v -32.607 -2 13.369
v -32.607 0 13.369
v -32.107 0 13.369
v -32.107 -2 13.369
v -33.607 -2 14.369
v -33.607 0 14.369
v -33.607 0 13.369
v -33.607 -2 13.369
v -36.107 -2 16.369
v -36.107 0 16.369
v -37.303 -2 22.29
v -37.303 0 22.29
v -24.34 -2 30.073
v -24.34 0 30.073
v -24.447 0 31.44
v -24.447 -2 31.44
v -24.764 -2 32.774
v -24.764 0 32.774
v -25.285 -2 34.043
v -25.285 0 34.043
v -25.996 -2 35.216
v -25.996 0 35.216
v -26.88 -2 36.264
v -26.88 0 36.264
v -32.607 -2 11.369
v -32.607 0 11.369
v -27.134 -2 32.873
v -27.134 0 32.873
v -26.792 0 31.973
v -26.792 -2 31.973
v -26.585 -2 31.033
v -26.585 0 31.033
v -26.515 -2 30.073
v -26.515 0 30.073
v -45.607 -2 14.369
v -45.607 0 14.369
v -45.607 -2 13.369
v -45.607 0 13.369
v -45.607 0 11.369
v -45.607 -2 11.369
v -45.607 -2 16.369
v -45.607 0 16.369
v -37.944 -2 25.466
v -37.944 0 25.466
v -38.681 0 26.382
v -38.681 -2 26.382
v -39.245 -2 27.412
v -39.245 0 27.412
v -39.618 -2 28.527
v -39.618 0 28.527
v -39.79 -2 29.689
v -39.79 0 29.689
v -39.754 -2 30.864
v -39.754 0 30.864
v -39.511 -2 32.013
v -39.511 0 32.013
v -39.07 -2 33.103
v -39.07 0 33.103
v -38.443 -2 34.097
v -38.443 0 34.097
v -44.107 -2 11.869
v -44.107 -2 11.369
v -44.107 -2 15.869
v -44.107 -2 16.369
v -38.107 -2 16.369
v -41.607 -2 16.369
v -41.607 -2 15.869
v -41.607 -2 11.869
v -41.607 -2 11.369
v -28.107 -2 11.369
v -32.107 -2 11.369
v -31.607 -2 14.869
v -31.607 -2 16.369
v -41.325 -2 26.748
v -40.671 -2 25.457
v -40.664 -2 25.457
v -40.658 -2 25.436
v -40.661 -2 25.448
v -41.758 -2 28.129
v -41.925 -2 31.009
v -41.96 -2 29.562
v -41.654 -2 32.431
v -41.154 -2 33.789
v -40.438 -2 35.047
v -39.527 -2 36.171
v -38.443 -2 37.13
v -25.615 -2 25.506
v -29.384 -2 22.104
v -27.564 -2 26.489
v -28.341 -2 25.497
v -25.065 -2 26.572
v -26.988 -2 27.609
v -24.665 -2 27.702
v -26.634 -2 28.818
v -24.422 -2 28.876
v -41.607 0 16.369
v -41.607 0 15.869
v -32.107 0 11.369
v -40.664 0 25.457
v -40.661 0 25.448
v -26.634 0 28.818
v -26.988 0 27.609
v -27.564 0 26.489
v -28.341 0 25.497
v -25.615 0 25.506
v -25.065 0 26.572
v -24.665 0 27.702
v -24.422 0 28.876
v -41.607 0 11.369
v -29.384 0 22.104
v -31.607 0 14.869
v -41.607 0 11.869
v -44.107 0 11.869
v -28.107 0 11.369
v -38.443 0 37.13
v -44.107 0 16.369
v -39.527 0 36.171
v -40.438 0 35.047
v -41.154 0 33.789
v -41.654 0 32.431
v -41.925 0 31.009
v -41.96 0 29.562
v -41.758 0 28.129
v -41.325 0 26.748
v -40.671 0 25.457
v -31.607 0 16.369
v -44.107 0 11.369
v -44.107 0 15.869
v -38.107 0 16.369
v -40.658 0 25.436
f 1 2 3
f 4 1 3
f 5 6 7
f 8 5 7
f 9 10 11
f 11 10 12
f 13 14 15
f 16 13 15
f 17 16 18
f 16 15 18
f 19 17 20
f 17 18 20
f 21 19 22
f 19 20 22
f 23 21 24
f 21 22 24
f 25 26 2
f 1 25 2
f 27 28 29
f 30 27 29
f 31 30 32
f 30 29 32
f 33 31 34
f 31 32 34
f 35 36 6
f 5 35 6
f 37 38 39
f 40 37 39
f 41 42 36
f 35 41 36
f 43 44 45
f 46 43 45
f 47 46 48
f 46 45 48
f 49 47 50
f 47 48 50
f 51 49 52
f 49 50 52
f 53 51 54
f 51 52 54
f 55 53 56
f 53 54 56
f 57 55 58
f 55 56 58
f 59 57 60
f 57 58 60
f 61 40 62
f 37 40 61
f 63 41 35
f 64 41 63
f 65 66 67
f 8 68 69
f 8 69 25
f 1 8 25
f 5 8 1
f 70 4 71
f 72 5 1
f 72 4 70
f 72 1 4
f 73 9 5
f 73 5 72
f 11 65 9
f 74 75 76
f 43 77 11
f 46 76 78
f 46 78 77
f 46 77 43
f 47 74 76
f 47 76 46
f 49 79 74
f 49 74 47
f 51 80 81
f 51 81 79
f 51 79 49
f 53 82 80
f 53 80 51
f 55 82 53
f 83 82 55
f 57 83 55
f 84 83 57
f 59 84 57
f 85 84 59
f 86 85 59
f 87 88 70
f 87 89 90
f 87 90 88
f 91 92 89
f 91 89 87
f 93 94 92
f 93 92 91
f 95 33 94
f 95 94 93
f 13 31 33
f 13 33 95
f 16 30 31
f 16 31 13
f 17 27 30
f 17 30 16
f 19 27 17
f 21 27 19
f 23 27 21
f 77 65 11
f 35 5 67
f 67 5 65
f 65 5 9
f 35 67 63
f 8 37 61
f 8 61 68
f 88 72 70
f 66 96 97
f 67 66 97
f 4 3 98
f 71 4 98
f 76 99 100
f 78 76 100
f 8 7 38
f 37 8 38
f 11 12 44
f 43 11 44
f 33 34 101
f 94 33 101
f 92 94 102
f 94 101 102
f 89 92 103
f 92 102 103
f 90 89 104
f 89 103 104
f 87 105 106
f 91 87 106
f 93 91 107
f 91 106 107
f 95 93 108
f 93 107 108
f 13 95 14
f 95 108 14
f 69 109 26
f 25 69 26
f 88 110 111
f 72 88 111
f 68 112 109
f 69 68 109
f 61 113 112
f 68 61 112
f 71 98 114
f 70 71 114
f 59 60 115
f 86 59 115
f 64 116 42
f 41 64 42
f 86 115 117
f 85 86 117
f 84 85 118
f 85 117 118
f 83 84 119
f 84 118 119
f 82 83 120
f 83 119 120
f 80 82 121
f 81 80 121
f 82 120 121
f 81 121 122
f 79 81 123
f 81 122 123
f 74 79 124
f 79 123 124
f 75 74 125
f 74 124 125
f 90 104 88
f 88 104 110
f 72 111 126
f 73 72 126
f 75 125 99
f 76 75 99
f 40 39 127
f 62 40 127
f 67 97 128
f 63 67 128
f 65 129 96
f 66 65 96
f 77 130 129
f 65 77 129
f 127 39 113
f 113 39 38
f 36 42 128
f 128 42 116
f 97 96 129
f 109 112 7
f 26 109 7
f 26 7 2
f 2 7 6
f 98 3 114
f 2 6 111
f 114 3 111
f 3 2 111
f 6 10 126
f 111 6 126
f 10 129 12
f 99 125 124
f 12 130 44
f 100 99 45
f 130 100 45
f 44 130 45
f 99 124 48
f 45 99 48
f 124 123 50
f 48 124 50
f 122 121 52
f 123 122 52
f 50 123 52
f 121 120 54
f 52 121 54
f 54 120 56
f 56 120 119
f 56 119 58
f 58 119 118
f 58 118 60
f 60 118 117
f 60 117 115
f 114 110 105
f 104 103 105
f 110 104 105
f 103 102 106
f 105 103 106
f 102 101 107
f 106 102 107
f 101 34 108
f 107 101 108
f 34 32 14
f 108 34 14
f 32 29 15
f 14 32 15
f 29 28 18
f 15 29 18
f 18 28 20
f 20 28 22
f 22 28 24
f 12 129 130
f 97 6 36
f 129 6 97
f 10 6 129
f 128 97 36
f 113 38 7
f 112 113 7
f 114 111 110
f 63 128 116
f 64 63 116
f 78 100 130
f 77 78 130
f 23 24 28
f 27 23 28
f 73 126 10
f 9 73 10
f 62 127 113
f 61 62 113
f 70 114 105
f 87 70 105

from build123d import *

# Parameters (mm, degrees)
F1_DEPTH = 2


with BuildPart() as f1:
    # F0 (on Front) → F1 (new body)
    with BuildSketch(Plane.XZ):
        with BuildLine():
            ThreePointArc((-38.4432851938, 37.1302077967), (-41.8189272985, 31.7253624753), (-40.6708321656, 25.4572534994))
            Line((-40.6708321656, 25.4572534994), (-40.6635933433, 25.4572770938))
            Line((-40.6635933433, 25.4572770938), (-37.9443538187, 25.4661402565))
            ThreePointArc((-37.9443538187, 25.4661402565), (-39.7897986845, 29.6891767659), (-38.4432851938, 34.0967390777))
            Line((-38.4432851938, 34.0967390777), (-38.4432851938, 37.1302077967))
        make_face()
        with BuildLine():
            ThreePointArc((-24.3404475114, 30.0725679845), (-24.9999427639, 33.418477972), (-26.8797747894, 36.2638741112))
            Line((-26.8797747894, 36.2638741112), (-27.1338318028, 32.8728124835))
            ThreePointArc((-27.1338318028, 32.8728124835), (-26.6713997999, 31.5064940955), (-26.5147945554, 30.0725679845))
            ThreePointArc((-26.5147945554, 30.0725679845), (-26.9883189893, 27.6094284081), (-28.3413854132, 25.4974404311))
            Line((-28.3413854132, 25.4974404311), (-25.6149070662, 25.5063271883))
            ThreePointArc((-25.6149070662, 25.5063271883), (-24.6650368609, 27.7021881539), (-24.3404475114, 30.0725679845))
        make_face()
        with BuildLine():
            Line((-28.3413854132, 25.4974404311), (-29.3841796517, 22.103513683))
            ThreePointArc((-29.3841796517, 22.103513683), (-27.2492776233, 23.5277028406), (-25.6149070662, 25.5063271883))
            Line((-25.6149070662, 25.5063271883), (-28.3413854132, 25.4974404311))
        make_face()
        with BuildLine():
            Line((-40.6610403277, 25.4482014486), (-40.6575024619, 25.4356247862))
            ThreePointArc((-40.6575024619, 25.4356247862), (-39.1888748371, 23.6403973669), (-37.3029250496, 22.2902484912))
            Line((-37.3029250496, 22.2902484912), (-37.9443538187, 25.4661402565))
            Line((-37.9443538187, 25.4661402565), (-40.6635933433, 25.4572770938))
            Line((-40.6635933433, 25.4572770938), (-40.6610403277, 25.4482014486))
        make_face()
        with BuildLine():
            Line((-40.6575024619, 25.4356247862), (-38.1070154905, 16.368968524))
            Line((-38.1070154905, 16.368968524), (-36.1070154905, 16.368968524))
            Line((-36.1070154905, 16.368968524), (-37.3029250496, 22.2902484912))
            ThreePointArc((-37.3029250496, 22.2902484912), (-39.1888748371, 23.6403973669), (-40.6575024619, 25.4356247862))
        make_face()
        with BuildLine():
            Line((-44.1070154905, 16.368968524), (-45.6070154905, 16.368968524))
            Line((-45.6070154905, 16.368968524), (-45.6070154905, 14.368968524))
            Line((-45.6070154905, 14.368968524), (-33.6070154905, 14.368968524))
            Line((-33.6070154905, 14.368968524), (-33.6070154905, 13.368968524))
            Line((-33.6070154905, 13.368968524), (-45.6070154905, 13.368968524))
            Line((-45.6070154905, 13.368968524), (-45.6070154905, 11.368968524))
            Line((-45.6070154905, 11.368968524), (-44.1070154905, 11.368968524))
            Line((-44.1070154905, 11.368968524), (-44.1070154905, 11.868968524))
            Line((-44.1070154905, 11.868968524), (-41.6070154905, 11.868968524))
            Line((-41.6070154905, 11.868968524), (-41.6070154905, 11.368968524))
            Line((-41.6070154905, 11.368968524), (-32.6070154905, 11.368968524))
            Line((-32.6070154905, 11.368968524), (-32.6070154905, 13.368968524))
            Line((-32.6070154905, 13.368968524), (-32.1070154905, 13.368968524))
            Line((-32.1070154905, 13.368968524), (-32.1070154905, 11.368968524))
            Line((-32.1070154905, 11.368968524), (-28.1070154905, 11.368968524))
            Line((-28.1070154905, 11.368968524), (-25.6149070662, 25.5063271883))
            ThreePointArc((-25.6149070662, 25.5063271883), (-27.2492776233, 23.5277028406), (-29.3841796517, 22.103513683))
            Line((-29.3841796517, 22.103513683), (-31.6070154905, 14.868968524))
            Line((-31.6070154905, 14.868968524), (-31.6070154905, 16.368968524))
            Line((-31.6070154905, 16.368968524), (-33.6070154905, 16.368968524))
            Line((-33.6070154905, 16.368968524), (-36.1070154905, 16.368968524))
            Line((-36.1070154905, 16.368968524), (-38.1070154905, 16.368968524))
            Line((-38.1070154905, 16.368968524), (-41.6070154905, 16.368968524))
            Line((-41.6070154905, 16.368968524), (-41.6070154905, 15.868968524))
            Line((-41.6070154905, 15.868968524), (-44.1070154905, 15.868968524))
            Line((-44.1070154905, 15.868968524), (-44.1070154905, 16.368968524))
        make_face()
    extrude(amount=F1_DEPTH)


solid = f1.part
